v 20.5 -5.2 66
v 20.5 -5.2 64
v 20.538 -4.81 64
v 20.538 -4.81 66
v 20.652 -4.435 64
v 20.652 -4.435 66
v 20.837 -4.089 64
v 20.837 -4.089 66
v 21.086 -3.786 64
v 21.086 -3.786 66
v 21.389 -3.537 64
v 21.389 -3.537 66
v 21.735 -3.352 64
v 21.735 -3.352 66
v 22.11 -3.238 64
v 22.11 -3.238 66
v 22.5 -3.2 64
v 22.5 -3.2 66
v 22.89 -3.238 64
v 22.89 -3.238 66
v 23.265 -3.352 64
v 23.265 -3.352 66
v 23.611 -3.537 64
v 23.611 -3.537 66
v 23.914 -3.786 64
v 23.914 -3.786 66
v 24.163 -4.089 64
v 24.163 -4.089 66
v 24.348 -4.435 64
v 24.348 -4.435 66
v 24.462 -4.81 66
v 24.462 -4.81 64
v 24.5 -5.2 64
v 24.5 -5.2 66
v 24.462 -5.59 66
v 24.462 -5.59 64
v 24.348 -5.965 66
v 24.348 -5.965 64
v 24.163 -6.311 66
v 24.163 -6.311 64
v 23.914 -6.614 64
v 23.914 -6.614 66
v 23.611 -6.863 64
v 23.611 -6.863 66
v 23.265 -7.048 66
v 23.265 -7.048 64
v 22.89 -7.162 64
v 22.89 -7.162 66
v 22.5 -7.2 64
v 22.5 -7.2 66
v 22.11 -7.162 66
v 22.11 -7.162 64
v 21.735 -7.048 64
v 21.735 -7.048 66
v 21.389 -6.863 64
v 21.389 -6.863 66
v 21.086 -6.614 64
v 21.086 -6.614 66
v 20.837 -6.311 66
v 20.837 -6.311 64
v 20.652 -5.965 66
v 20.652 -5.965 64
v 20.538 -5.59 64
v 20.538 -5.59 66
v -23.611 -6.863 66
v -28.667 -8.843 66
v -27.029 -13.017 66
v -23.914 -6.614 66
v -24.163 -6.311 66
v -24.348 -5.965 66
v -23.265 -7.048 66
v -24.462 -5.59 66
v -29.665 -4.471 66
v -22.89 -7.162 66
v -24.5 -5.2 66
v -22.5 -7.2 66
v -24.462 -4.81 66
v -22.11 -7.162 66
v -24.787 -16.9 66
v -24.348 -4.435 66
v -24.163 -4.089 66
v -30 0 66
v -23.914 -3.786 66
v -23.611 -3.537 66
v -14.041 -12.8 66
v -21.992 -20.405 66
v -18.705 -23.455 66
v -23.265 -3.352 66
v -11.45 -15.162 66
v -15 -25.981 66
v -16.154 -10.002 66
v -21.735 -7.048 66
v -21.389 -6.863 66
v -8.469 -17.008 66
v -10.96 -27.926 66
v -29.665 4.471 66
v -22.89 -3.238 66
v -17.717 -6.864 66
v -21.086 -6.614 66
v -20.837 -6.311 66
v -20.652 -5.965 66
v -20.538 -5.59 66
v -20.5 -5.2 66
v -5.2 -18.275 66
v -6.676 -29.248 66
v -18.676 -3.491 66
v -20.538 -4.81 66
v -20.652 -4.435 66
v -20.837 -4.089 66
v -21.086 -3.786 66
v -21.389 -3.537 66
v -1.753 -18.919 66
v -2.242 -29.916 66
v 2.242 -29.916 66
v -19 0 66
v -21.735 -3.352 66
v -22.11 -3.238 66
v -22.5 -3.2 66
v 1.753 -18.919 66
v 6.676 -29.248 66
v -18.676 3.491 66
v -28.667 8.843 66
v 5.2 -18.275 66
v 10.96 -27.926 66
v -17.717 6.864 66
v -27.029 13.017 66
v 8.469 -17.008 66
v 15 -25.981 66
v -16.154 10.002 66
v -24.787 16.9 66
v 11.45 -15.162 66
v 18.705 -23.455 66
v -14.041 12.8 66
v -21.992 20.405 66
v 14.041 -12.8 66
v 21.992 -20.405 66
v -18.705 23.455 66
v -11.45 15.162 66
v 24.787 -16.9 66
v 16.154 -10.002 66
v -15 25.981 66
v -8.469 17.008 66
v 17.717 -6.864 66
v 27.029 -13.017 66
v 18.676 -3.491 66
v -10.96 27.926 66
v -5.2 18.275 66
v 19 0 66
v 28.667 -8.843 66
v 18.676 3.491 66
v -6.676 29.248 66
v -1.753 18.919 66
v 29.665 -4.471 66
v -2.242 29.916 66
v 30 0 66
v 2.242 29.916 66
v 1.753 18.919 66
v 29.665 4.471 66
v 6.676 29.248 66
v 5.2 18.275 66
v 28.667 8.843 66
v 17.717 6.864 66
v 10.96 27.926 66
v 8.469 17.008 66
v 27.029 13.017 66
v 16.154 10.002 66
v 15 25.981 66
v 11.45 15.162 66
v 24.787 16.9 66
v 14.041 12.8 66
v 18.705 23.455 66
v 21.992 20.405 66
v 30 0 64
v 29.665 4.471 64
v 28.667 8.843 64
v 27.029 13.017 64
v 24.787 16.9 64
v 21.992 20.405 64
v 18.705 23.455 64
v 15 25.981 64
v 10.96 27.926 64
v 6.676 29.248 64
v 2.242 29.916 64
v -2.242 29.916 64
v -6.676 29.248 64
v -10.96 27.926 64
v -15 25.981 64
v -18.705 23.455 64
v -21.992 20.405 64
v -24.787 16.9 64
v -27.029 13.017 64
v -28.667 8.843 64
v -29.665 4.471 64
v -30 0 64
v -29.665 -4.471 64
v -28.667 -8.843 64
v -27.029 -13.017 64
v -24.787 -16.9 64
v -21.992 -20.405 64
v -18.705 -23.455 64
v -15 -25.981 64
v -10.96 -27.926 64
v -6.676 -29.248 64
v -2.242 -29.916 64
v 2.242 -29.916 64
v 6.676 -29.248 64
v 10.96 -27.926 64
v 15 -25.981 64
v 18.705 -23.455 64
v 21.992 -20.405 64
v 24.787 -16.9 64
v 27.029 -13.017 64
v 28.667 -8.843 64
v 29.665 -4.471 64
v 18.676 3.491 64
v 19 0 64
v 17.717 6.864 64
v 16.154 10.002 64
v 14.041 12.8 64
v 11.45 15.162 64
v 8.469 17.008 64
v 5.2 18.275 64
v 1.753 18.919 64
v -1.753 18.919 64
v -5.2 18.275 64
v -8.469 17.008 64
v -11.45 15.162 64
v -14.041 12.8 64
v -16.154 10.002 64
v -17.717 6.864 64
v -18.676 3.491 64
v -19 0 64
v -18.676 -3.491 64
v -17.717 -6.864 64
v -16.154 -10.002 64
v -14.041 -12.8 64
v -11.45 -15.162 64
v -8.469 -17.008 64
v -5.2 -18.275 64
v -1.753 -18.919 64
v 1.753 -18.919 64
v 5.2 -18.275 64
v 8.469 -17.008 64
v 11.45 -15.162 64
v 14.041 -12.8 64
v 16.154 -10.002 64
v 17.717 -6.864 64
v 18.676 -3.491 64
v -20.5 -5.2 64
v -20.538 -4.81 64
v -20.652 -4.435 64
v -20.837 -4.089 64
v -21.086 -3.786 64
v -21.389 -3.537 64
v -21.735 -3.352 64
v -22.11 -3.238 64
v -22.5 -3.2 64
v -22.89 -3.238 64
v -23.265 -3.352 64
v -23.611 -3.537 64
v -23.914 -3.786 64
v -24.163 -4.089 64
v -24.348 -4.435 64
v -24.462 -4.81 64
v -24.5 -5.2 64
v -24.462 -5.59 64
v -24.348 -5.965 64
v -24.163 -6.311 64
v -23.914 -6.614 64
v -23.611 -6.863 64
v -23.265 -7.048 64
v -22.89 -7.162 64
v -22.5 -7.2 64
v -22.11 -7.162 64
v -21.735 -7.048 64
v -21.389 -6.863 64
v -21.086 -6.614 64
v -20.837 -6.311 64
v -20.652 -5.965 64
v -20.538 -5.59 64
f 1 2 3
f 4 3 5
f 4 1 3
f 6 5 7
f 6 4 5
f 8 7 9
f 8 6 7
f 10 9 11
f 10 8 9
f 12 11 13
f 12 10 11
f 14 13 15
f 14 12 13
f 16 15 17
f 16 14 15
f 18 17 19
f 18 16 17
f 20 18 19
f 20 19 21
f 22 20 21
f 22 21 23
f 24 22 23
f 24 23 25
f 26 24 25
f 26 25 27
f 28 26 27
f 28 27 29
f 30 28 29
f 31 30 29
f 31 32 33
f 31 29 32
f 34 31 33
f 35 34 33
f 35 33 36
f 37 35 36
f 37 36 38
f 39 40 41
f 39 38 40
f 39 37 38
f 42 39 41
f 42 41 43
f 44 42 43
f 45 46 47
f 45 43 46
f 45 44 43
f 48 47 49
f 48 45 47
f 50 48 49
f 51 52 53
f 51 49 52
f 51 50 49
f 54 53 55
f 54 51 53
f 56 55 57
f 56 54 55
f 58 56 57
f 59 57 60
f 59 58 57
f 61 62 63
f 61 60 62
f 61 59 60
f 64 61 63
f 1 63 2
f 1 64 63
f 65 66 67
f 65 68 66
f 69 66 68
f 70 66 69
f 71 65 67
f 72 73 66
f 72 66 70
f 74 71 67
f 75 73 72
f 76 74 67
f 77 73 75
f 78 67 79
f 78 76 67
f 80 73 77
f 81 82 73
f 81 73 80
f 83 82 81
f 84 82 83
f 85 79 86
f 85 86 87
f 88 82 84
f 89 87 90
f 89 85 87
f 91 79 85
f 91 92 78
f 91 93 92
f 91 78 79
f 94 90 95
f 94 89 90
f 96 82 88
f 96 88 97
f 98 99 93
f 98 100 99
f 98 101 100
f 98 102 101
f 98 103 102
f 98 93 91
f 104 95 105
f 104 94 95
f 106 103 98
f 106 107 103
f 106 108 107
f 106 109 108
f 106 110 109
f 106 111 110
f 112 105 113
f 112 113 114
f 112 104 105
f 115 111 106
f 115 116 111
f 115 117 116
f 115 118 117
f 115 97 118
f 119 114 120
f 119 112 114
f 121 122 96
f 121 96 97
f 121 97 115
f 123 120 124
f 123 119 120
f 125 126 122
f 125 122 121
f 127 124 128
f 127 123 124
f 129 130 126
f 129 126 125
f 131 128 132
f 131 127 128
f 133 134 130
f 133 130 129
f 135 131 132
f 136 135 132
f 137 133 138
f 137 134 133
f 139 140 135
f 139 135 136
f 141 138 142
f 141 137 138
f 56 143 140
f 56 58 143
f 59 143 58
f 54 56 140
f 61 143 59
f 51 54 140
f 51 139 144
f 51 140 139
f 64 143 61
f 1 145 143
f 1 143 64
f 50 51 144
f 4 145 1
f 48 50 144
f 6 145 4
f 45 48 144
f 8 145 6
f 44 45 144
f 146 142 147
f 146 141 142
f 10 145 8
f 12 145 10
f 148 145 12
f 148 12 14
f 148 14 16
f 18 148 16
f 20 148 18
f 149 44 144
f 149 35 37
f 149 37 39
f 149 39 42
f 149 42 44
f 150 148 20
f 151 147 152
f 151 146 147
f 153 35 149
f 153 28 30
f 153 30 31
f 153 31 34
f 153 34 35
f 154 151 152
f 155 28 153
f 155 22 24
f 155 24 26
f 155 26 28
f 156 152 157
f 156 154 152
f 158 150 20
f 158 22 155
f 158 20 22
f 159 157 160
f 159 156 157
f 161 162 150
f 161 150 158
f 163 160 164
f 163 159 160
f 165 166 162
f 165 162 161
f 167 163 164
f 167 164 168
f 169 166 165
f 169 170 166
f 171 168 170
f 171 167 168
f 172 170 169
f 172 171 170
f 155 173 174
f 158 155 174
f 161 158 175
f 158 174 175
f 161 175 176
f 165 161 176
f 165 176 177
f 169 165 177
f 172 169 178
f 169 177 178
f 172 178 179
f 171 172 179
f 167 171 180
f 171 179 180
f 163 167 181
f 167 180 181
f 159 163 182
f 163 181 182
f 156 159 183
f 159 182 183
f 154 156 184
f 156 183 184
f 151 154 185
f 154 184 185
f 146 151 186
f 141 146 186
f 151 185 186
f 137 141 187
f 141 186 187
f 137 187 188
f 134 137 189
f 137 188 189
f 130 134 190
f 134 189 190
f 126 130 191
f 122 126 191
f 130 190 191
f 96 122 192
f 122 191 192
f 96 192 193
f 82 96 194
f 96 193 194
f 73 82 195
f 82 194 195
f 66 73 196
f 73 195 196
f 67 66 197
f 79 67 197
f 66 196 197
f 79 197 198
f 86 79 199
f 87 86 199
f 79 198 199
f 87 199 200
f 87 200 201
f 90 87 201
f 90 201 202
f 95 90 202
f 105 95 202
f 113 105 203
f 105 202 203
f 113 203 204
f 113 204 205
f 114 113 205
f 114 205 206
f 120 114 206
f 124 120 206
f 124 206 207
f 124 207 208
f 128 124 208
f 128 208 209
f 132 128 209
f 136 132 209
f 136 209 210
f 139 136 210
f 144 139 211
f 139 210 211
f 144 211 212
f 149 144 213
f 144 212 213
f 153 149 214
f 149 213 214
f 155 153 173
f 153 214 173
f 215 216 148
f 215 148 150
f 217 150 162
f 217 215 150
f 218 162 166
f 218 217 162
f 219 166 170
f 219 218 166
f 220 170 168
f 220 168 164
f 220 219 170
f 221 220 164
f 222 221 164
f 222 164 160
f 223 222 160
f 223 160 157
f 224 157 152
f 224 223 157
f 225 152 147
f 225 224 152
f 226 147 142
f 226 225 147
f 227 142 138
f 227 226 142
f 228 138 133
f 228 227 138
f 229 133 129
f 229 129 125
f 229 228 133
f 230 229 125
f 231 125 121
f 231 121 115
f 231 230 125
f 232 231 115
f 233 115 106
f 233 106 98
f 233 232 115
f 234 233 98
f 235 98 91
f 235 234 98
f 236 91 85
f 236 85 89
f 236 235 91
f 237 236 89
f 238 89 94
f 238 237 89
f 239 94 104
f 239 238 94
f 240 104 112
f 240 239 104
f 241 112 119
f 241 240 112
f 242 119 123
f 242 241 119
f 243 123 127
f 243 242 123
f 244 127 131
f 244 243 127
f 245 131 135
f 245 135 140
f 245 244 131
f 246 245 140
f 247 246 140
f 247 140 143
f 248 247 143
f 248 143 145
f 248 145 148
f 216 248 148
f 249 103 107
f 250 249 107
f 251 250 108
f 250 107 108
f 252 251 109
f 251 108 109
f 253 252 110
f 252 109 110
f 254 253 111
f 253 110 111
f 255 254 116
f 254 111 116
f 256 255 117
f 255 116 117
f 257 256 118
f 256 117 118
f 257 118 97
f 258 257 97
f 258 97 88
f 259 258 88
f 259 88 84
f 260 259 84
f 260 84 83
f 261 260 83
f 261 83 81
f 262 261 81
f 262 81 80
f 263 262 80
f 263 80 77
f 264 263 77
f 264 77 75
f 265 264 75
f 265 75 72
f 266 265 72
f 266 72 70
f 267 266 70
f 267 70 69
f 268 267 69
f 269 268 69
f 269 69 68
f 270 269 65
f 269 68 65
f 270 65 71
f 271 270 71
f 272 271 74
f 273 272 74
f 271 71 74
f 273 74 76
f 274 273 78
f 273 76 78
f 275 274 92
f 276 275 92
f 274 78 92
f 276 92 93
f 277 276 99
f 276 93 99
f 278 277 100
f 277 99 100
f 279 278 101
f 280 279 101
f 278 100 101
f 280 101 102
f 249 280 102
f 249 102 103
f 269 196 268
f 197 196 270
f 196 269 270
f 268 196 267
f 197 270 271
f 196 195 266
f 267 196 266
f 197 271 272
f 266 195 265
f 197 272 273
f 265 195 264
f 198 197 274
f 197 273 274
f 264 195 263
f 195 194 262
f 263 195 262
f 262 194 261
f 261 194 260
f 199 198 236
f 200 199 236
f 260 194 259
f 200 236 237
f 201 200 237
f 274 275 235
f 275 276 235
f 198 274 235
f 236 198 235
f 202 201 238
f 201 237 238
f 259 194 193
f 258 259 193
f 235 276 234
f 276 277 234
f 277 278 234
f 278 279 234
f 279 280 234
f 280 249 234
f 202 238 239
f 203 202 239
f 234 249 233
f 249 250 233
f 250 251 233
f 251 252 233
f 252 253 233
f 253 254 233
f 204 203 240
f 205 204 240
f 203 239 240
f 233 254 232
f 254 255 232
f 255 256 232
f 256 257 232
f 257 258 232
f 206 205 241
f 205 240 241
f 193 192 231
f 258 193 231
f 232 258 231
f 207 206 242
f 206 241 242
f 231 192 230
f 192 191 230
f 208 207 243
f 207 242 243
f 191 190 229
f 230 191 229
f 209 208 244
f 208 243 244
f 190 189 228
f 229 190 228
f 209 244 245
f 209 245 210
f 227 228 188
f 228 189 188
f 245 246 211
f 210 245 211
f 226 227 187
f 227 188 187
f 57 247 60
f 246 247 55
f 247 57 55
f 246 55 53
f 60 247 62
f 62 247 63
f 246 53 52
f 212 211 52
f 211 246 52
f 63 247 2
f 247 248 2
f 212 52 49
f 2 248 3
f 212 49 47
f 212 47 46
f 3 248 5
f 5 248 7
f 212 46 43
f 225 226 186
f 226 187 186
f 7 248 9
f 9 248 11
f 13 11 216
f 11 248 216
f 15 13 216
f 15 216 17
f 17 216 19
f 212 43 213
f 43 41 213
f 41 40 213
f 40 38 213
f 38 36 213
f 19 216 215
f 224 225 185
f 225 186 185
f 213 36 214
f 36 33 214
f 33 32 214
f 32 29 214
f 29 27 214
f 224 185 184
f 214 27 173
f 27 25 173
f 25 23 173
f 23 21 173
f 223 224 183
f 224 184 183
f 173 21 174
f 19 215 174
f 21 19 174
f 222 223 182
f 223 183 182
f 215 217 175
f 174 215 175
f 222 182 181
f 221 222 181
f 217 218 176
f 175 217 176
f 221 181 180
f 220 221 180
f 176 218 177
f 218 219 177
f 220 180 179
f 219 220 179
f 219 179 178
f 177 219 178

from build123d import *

# Parameters (mm, degrees)
SKETCH023_R     = 30
SKETCH023_R_2   = 19
PAD007_DEPTH    = 2
SKETCH125_R     = 2
POCKET053_DEPTH = 171.753761


with BuildPart() as part:
    # Sketch023 → Pad007 (new body)
    with BuildSketch(Plane.XY):
        Circle(SKETCH023_R)
        Circle(SKETCH023_R_2, mode=Mode.SUBTRACT)
    extrude(amount=PAD007_DEPTH)

    # Sketch125 → Pocket053 (cut, through all)
    with BuildSketch(Plane.XY.offset(2)):
        with Locations((-22.5, -5.2)):
            Circle(SKETCH125_R)
    pocket053 = extrude(amount=-POCKET053_DEPTH, mode=Mode.SUBTRACT)

    # Mirrored: Pocket053 across Sketch125 V_Axis
    add(pocket053.mirror(Plane(origin=(0, 0, 2), x_dir=(0, 0, 1), z_dir=(1, 0, 0))), mode=Mode.SUBTRACT)


with BuildPart() as part_1:
    # Body007 placement: moved
    add(part.part.moved(Location((0, 0, 64))))


solid = part_1.part
